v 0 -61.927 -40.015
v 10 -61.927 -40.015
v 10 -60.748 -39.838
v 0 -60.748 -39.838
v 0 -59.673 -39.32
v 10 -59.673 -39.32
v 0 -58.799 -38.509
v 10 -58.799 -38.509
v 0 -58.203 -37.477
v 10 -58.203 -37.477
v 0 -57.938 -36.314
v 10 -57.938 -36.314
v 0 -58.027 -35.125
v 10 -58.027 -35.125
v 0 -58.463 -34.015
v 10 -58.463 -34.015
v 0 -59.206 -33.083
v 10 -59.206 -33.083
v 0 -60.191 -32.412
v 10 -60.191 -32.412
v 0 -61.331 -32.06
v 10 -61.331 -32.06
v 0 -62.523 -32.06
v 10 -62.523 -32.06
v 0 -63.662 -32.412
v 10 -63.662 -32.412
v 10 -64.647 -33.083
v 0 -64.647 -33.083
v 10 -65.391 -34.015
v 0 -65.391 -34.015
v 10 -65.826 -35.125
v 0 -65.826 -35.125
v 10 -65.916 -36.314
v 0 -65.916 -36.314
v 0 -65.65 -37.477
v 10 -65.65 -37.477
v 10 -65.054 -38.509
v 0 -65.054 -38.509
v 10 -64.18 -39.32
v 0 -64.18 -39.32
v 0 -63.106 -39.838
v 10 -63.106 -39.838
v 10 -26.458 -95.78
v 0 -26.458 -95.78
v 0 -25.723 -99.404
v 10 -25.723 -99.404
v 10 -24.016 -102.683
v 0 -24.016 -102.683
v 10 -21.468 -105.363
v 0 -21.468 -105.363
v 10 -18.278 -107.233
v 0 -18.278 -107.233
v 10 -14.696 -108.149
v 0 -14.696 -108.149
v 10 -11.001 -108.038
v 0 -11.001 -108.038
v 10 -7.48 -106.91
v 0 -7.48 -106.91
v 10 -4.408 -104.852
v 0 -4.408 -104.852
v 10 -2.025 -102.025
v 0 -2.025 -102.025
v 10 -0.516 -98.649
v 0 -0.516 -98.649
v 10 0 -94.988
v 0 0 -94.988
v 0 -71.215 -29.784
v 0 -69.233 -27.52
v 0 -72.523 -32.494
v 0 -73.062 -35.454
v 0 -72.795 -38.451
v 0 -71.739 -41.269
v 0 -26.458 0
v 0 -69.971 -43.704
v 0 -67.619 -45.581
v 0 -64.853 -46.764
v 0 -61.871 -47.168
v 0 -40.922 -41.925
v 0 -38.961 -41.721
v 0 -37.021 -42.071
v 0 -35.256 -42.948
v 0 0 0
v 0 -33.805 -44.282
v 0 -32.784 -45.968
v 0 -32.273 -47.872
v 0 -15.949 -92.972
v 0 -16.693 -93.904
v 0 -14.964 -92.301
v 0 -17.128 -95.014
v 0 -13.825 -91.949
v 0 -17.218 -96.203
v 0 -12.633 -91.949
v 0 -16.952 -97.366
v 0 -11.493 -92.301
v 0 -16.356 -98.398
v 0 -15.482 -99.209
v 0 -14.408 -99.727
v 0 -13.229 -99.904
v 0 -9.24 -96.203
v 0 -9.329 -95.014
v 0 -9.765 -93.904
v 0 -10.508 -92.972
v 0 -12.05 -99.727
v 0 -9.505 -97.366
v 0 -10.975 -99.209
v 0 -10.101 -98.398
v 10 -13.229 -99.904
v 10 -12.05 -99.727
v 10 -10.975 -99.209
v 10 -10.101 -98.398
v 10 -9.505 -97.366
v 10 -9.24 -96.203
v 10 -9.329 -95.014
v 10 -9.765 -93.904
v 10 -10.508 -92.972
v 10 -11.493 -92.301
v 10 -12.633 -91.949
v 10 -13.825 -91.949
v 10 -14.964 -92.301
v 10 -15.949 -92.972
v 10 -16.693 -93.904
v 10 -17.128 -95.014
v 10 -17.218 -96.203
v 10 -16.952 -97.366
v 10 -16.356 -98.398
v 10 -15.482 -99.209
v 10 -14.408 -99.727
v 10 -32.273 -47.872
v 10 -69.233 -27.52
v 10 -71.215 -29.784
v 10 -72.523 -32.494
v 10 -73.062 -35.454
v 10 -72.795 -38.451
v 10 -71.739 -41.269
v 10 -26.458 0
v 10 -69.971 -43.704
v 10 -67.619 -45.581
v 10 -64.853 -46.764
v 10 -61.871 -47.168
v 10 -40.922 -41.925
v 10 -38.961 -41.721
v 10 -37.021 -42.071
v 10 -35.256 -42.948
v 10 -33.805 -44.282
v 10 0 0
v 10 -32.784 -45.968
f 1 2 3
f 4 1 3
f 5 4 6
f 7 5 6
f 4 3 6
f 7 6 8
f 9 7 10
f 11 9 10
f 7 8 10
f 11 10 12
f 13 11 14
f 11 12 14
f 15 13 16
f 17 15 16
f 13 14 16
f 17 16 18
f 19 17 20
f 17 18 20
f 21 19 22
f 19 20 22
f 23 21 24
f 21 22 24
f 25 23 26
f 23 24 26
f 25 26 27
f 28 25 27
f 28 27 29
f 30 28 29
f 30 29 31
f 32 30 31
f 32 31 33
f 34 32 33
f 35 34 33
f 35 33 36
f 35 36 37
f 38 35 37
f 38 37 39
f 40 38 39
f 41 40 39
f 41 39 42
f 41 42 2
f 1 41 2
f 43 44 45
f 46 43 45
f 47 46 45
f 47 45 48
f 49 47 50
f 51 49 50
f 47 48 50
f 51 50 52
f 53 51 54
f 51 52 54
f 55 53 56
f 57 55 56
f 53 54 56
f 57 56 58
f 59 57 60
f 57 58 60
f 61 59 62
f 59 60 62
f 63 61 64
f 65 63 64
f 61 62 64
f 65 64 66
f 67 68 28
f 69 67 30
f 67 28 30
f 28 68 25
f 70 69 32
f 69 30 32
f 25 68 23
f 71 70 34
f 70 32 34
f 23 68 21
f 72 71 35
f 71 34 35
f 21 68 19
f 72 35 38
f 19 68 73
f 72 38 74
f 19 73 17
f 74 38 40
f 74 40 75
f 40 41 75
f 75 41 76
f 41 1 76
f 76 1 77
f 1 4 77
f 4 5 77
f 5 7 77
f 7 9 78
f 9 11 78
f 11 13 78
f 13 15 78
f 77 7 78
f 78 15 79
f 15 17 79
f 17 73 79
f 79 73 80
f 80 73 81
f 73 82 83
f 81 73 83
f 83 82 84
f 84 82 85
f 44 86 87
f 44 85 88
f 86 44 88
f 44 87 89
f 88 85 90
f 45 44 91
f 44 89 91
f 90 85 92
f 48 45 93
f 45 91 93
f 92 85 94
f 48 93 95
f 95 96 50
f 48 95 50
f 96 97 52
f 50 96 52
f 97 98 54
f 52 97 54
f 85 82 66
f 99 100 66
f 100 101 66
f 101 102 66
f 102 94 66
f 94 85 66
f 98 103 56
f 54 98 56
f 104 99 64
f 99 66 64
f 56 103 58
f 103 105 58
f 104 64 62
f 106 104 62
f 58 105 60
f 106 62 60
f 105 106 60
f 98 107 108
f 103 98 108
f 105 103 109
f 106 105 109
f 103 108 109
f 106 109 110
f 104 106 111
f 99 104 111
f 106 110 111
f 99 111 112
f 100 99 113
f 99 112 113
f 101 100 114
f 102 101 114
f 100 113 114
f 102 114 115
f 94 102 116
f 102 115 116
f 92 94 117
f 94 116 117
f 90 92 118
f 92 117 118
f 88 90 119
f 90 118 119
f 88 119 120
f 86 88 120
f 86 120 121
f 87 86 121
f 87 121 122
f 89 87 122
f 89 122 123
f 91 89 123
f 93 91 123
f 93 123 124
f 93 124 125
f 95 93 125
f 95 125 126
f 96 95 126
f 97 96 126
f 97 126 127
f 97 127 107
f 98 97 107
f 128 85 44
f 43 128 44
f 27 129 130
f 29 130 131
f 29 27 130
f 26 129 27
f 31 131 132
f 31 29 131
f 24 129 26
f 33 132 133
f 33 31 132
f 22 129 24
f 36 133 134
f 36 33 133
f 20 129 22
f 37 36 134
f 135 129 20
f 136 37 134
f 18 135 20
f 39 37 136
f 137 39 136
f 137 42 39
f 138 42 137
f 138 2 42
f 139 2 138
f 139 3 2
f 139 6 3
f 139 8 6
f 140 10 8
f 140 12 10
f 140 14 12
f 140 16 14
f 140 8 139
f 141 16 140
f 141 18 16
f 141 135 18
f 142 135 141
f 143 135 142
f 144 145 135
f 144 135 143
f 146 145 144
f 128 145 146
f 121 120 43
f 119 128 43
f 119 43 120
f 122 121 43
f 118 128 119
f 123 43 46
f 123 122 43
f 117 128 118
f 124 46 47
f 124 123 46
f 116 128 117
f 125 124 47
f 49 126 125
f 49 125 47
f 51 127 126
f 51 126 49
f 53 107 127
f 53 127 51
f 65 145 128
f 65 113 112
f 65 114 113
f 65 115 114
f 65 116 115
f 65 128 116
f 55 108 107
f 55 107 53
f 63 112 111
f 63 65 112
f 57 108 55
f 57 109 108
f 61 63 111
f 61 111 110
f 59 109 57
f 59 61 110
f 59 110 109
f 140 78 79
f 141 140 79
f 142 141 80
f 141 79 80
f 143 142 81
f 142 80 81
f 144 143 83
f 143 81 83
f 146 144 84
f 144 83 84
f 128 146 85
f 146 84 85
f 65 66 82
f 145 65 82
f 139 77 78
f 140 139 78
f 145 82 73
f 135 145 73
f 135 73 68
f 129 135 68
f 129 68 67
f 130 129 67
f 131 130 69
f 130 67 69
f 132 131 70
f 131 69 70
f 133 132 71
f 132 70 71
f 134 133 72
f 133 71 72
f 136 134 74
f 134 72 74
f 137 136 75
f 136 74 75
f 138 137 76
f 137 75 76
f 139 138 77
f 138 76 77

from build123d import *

# Parameters (mm, degrees)
EXTRUDE_1_DEPTH     = 10
SKETCH_2_R          = 4
CUT_EXTRUDE_1_DEPTH = 131.970599025


with BuildPart() as part:
    # Эскиз1 → Вытянуть1 (new body)
    with BuildSketch(Plane(origin=(0, 0, 0), x_dir=(0, 0, -1), z_dir=(1, 0, 0))):
        with BuildLine():
            Line((0, 0), (0, -26.457513111))
            Line((0, -26.457513111), (27.520390874, -69.232651823))
            ThreePointArc((27.520390874, -69.232651823), (39.895894439, -72.361692048), (47.168175164, -61.870842975))
            Line((47.168175164, -61.870842975), (41.925259283, -40.921571184))
            ThreePointArc((41.925259283, -40.921571184), (42.947914526, -35.255861998), (47.872279974, -32.273126802))
            Line((47.872279974, -32.273126802), (95.780101016, -26.457513111))
            ThreePointArc((95.780101016, -26.457513111), (108.222992472, -12.84453329), (94.988313332, 0))
            Line((94.988313332, 0), (0, 0))
        make_face()
    extrude(amount=EXTRUDE_1_DEPTH)

    # Эскиз2 → Вырез-Вытянуть1 (cut, through all)
    with BuildSketch(Plane(origin=(10, 0, 0), x_dir=(0, 0, -1), z_dir=(1, 0, 0))):
        with Locations((95.904397826, -13.228756555)):
            Circle(SKETCH_2_R)
        with Locations((36.015412993, -61.926732738)):
            Circle(SKETCH_2_R)
    extrude(amount=-CUT_EXTRUDE_1_DEPTH, mode=Mode.SUBTRACT)


solid = part.part
